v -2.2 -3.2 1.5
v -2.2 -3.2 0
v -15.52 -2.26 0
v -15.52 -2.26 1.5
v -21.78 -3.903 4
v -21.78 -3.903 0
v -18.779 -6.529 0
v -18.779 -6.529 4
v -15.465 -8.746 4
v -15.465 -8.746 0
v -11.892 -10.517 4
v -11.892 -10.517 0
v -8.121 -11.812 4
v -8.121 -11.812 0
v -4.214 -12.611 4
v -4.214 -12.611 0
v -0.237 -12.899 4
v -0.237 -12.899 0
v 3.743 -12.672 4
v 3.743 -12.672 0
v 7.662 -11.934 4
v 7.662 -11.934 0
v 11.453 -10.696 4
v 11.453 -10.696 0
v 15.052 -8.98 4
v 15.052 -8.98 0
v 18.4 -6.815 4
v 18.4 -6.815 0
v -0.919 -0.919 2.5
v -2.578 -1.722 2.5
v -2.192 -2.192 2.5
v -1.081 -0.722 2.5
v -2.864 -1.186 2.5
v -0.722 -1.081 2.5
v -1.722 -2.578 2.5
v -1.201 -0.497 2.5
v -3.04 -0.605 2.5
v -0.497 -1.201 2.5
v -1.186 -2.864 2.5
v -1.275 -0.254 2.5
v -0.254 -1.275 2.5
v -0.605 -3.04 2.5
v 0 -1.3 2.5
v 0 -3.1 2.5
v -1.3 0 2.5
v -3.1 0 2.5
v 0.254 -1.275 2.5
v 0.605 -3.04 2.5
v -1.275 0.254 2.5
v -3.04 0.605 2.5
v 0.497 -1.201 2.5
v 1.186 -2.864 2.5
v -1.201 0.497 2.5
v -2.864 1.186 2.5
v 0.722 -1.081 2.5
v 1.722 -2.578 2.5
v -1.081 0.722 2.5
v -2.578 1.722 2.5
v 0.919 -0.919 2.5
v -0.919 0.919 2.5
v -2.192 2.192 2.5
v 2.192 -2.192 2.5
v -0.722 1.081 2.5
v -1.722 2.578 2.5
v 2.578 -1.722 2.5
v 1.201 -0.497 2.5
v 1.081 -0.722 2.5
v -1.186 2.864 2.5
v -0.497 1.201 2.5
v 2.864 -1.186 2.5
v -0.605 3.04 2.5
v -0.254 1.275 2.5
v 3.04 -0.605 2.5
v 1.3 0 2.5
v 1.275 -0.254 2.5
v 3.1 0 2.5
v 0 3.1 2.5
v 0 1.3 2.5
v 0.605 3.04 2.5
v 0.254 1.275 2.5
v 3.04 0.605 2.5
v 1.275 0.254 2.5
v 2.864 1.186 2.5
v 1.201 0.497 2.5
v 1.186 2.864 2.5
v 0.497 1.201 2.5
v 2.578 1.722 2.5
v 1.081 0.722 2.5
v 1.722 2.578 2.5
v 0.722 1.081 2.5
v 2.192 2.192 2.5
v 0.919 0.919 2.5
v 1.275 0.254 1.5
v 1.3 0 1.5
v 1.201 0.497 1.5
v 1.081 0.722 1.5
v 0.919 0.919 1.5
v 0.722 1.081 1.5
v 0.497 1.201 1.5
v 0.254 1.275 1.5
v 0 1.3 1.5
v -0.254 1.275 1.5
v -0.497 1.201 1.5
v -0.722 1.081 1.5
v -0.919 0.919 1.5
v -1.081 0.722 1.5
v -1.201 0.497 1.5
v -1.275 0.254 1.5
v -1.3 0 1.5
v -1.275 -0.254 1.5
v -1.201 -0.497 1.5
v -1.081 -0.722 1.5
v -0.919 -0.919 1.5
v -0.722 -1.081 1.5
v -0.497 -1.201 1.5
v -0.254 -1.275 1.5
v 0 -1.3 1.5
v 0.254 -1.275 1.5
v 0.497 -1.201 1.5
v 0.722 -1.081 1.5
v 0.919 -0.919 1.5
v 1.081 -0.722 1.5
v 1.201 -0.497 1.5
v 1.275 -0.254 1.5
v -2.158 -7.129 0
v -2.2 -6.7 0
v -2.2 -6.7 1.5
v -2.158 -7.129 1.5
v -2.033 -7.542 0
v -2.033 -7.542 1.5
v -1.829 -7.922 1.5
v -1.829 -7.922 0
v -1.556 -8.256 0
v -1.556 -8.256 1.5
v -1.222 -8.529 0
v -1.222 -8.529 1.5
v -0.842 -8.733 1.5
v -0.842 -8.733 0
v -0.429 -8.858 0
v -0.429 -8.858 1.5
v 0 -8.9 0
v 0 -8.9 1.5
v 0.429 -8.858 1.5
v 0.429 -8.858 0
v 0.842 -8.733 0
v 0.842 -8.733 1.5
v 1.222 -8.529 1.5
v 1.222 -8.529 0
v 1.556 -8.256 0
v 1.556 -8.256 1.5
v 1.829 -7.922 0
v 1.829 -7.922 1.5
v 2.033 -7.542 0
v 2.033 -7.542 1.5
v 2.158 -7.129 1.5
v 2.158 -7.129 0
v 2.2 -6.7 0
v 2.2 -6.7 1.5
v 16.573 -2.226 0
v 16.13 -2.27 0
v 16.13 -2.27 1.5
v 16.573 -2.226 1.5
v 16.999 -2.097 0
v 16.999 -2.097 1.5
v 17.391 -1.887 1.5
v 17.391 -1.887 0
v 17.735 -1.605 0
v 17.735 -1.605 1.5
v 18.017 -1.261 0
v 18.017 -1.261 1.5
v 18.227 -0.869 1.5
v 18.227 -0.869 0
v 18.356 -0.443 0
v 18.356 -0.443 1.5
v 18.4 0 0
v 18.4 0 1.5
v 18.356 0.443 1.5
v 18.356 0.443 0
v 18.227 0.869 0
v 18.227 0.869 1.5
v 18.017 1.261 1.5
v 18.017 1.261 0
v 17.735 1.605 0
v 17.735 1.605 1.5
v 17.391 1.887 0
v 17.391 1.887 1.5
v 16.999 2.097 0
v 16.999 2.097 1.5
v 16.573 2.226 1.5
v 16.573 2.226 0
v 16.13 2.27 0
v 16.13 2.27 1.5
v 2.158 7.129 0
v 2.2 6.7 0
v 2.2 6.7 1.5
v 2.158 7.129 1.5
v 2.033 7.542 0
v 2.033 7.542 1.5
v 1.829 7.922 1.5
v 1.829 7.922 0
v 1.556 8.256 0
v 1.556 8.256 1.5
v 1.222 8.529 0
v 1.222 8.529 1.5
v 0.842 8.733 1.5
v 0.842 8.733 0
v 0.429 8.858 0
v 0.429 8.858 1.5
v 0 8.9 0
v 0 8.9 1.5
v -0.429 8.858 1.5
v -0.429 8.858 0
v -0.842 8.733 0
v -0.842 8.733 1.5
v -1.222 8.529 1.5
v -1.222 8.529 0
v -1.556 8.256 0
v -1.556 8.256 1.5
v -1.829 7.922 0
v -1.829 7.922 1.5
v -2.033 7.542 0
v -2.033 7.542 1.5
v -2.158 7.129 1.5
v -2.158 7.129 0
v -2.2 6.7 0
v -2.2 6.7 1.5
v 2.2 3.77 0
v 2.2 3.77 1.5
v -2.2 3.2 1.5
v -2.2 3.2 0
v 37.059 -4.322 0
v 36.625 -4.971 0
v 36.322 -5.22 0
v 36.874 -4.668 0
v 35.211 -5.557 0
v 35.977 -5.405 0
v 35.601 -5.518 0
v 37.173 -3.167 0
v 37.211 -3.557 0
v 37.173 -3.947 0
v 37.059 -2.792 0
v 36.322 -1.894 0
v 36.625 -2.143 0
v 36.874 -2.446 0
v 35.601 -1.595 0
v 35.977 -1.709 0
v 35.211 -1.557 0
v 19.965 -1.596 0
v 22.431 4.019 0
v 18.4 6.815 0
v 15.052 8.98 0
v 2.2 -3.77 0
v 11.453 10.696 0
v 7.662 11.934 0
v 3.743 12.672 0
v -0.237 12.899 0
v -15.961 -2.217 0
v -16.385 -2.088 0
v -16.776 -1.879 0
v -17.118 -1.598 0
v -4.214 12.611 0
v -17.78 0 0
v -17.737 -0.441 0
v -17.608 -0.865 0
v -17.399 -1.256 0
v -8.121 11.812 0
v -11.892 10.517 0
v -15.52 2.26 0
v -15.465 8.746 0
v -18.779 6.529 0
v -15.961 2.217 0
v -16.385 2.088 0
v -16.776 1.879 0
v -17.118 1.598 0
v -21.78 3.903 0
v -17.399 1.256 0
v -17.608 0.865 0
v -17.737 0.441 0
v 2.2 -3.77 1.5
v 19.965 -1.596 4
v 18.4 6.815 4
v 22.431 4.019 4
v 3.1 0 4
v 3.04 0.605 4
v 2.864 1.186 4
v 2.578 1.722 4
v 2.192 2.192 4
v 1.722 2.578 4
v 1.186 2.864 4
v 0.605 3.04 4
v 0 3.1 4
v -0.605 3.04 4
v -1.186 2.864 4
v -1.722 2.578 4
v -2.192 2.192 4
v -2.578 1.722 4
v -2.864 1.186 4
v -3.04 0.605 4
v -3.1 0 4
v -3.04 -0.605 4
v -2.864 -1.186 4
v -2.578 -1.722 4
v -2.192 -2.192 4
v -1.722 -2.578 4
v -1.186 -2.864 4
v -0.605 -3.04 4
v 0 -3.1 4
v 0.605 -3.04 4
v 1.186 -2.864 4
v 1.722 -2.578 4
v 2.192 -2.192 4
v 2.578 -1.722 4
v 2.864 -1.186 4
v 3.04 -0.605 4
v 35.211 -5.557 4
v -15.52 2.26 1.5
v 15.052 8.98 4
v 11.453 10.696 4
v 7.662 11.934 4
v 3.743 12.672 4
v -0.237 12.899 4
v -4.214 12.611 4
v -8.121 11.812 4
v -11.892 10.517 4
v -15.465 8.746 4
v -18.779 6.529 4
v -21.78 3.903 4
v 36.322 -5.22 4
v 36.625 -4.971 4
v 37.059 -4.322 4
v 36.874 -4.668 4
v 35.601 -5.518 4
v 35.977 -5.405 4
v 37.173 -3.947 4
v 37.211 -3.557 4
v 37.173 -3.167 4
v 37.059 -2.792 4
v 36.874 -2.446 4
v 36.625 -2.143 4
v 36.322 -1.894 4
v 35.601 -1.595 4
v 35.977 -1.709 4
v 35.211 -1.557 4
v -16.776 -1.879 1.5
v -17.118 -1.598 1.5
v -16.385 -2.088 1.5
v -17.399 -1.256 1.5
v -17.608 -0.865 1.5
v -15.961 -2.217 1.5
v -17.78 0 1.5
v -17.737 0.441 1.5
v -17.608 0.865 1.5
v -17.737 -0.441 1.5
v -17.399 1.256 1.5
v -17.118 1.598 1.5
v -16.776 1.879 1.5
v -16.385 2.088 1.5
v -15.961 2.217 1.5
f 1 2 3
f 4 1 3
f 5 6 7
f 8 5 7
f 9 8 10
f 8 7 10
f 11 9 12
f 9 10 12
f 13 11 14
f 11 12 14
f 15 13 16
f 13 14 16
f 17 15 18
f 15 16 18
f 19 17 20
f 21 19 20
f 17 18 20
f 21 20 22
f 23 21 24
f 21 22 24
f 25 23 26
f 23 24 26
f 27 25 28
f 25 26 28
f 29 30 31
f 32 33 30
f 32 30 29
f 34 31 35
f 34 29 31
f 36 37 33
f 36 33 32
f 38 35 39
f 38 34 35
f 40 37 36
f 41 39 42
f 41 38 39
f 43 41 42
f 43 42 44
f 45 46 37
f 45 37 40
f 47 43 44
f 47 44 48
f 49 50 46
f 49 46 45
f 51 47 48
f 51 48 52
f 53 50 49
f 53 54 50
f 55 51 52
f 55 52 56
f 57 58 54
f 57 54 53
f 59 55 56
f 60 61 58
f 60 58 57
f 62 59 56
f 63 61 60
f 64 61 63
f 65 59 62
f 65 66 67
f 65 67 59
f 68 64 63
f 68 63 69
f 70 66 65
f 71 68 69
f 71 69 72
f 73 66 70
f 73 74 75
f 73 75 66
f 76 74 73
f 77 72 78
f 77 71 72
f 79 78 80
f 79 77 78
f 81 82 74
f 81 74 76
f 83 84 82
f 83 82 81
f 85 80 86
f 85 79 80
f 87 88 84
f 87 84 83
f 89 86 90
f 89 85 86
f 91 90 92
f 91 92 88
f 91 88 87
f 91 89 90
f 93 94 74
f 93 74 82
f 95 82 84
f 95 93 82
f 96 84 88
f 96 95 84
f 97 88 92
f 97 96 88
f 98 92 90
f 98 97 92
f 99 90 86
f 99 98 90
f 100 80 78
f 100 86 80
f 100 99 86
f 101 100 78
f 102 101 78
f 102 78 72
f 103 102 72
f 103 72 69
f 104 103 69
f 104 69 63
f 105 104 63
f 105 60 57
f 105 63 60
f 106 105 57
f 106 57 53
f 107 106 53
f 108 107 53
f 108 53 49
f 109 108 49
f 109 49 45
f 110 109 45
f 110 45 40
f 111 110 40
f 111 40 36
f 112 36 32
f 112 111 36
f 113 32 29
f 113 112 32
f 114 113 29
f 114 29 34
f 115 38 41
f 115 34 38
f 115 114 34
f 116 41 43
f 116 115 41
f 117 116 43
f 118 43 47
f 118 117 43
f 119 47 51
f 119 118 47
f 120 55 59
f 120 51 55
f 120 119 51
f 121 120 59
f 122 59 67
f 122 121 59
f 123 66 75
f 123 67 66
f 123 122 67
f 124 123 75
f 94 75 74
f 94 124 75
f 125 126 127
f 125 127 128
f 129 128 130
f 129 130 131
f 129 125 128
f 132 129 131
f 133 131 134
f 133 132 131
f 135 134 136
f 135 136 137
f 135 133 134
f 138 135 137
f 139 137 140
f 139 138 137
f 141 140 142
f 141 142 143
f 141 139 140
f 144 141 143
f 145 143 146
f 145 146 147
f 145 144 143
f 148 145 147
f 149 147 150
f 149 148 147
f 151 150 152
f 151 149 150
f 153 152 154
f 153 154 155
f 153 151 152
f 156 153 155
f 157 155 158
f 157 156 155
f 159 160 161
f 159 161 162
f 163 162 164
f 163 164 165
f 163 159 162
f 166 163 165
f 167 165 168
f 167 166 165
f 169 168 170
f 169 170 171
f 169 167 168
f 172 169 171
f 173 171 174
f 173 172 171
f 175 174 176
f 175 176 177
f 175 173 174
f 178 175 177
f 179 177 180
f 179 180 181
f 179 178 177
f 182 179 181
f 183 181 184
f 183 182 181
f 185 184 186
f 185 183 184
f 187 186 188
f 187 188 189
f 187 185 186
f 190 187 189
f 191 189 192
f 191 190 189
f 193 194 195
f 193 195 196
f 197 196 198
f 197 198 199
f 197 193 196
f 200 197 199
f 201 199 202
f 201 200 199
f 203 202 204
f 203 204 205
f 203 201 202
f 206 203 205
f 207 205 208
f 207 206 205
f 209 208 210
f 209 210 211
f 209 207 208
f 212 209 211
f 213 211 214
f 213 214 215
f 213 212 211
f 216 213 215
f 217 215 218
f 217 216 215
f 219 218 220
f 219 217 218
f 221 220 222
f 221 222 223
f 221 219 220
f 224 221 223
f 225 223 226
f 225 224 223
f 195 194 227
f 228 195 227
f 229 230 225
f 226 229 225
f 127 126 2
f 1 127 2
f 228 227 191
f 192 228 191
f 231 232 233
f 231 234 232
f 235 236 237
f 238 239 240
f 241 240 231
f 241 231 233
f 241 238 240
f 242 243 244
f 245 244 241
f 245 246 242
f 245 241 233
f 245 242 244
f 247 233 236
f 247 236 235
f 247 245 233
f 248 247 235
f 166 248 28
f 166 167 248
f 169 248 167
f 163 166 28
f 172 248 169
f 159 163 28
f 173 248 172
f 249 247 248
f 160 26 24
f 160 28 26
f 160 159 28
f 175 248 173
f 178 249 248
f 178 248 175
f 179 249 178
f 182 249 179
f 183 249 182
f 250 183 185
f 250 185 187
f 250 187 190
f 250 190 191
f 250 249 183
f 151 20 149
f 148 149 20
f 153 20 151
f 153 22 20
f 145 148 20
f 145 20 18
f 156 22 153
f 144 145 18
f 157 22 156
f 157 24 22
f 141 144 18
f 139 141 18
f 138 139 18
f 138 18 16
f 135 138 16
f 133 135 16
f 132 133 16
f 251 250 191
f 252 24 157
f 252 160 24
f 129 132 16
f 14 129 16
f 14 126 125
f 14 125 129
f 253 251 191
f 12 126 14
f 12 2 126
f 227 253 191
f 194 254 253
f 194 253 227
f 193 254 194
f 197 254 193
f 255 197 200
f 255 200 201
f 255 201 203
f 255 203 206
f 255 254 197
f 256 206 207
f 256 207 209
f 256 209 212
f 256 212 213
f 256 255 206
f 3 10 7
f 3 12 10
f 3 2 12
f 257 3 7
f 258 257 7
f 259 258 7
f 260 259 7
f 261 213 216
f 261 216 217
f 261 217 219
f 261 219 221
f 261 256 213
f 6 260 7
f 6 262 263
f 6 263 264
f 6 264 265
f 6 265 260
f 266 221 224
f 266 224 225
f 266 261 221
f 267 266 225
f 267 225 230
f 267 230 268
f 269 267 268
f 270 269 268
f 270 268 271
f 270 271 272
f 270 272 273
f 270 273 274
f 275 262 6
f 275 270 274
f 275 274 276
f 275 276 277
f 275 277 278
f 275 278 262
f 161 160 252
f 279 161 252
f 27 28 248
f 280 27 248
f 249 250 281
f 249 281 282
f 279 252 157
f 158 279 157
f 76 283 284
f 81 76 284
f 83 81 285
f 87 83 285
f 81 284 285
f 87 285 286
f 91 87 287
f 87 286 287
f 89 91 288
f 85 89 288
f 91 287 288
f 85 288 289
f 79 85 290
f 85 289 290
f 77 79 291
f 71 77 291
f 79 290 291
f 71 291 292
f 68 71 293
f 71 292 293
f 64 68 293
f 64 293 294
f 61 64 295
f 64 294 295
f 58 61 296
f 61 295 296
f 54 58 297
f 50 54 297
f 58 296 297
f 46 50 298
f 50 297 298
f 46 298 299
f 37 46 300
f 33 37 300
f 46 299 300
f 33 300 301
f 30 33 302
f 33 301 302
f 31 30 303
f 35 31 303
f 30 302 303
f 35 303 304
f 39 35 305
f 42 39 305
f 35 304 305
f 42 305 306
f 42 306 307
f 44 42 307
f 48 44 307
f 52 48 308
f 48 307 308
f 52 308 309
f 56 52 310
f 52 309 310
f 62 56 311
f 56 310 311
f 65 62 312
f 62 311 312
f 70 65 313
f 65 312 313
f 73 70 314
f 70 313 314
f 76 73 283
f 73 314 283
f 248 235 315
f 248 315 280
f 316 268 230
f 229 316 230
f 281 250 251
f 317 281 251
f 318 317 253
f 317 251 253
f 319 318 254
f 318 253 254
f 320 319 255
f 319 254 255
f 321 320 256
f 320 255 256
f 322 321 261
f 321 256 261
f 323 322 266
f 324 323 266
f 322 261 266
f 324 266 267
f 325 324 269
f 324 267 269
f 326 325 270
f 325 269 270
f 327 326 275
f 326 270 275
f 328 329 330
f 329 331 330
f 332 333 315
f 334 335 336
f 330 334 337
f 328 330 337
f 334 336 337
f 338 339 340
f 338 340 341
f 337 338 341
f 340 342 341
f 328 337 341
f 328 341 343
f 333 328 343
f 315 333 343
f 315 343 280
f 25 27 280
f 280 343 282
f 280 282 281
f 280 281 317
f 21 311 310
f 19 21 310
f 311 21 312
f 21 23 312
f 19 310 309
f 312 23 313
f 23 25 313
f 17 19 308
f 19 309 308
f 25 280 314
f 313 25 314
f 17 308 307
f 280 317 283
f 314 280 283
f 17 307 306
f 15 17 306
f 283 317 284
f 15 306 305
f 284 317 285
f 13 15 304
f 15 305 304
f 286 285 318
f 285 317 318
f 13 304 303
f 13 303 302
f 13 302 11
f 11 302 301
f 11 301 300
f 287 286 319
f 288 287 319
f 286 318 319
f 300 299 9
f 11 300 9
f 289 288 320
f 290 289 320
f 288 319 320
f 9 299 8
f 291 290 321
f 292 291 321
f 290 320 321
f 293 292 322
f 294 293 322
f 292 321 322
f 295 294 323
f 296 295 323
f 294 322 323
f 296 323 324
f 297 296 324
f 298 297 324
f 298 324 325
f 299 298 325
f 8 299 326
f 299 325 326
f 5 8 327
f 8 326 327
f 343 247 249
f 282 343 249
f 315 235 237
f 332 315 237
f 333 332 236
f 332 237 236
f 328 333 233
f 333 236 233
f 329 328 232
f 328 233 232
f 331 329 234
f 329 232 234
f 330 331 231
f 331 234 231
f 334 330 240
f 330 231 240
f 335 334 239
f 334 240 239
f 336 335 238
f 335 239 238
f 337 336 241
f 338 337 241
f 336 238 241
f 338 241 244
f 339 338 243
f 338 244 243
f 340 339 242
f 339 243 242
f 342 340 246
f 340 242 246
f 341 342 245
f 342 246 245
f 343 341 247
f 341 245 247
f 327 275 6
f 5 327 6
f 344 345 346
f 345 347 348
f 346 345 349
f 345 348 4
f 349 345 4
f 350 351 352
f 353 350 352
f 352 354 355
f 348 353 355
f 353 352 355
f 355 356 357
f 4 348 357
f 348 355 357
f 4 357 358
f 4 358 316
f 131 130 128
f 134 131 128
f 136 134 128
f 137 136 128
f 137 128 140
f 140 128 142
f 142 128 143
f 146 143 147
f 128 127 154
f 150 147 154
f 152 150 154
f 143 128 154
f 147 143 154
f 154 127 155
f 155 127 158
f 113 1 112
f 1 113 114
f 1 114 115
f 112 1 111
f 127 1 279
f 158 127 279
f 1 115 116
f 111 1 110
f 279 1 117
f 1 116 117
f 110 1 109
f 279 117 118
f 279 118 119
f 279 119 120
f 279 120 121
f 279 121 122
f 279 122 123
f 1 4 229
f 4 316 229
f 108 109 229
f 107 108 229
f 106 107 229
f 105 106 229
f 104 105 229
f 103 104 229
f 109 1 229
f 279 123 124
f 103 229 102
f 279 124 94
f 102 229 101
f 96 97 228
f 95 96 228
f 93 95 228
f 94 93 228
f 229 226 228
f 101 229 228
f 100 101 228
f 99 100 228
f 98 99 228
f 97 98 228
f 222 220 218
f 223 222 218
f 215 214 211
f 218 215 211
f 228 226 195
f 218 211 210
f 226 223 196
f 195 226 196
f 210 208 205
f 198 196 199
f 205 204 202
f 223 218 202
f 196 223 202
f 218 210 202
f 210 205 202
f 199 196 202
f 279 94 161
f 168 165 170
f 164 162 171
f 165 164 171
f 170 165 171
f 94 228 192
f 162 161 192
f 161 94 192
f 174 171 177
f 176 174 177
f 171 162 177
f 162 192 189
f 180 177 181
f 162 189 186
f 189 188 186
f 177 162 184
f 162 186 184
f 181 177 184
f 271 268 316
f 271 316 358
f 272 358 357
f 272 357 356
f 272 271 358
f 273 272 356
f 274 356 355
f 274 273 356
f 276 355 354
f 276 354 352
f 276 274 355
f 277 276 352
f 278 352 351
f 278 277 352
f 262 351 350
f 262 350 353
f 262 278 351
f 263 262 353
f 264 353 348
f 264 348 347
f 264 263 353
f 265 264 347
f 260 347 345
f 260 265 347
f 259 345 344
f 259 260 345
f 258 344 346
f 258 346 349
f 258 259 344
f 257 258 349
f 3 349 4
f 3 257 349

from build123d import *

# Parameters (mm, degrees)
PAD_DEPTH       = 4
POCKET_DEPTH    = 1.5
SKETCH002_R     = 3.1
POCKET001_DEPTH = 1.5
SKETCH003_R     = 1.3
POCKET002_DEPTH = 4.001


with BuildPart() as part:
    # Sketch001 → Pad (new body)
    with BuildSketch(Plane.XY):
        with BuildLine():
            Line((-21.78, 0), (-21.78, 3.903012))
            ThreePointArc((18.4, 6.81485), (-2.23065, 12.819278), (-21.78, 3.903012))
            Line((18.4, 6.81485), (22.430655, 4.019184))
            Line((35.211283, -1.556892), (22.430655, 4.019184))
            ThreePointArc((35.211283, -5.556892), (37.211283, -3.556892), (35.211283, -1.556892))
            Line((35.211283, -5.556892), (19.965446, -1.596008))
            Line((18.4, -6.81485), (19.965446, -1.596008))
            ThreePointArc((-21.78, -3.903012), (-2.23065, -12.819278), (18.4, -6.81485))
            Line((-21.78, 0), (-21.78, -3.903012))
        make_face()
    extrude(amount=PAD_DEPTH)

    # Sketch → Pocket (cut)
    with BuildSketch(Plane.XY):
        with BuildLine():
            ThreePointArc((2.2, 6.7), (0, 8.9), (-2.2, 6.7))
            Line((-2.2, 3.2), (-2.2, 6.7))
            Line((-15.52, 2.26), (-2.2, 3.2))
            ThreePointArc((-15.52, 2.26), (-17.78, 0), (-15.52, -2.26))
            Line((-2.2, -3.2), (-15.52, -2.26))
            Line((-2.2, -6.7), (-2.2, -3.2))
            ThreePointArc((-2.2, -6.7), (0, -8.9), (2.2, -6.7))
            Line((2.2, -3.77), (2.2, -6.7))
            Line((16.13, -2.27), (2.2, -3.77))
            ThreePointArc((16.13, -2.27), (18.4, 0), (16.13, 2.27))
            Line((2.2, 3.77), (16.13, 2.27))
            Line((2.2, 6.7), (2.2, 3.77))
        make_face()
    extrude(amount=POCKET_DEPTH, mode=Mode.SUBTRACT)

    # Sketch002 → Pocket001 (cut)
    with BuildSketch(Plane.XY.offset(4)):
        Circle(SKETCH002_R)
    extrude(amount=-POCKET001_DEPTH, mode=Mode.SUBTRACT)

    # Sketch003 → Pocket002 (cut, through all)
    with BuildSketch(Plane.XY):
        Circle(SKETCH003_R)
    extrude(amount=POCKET002_DEPTH, mode=Mode.SUBTRACT)


solid = part.part
